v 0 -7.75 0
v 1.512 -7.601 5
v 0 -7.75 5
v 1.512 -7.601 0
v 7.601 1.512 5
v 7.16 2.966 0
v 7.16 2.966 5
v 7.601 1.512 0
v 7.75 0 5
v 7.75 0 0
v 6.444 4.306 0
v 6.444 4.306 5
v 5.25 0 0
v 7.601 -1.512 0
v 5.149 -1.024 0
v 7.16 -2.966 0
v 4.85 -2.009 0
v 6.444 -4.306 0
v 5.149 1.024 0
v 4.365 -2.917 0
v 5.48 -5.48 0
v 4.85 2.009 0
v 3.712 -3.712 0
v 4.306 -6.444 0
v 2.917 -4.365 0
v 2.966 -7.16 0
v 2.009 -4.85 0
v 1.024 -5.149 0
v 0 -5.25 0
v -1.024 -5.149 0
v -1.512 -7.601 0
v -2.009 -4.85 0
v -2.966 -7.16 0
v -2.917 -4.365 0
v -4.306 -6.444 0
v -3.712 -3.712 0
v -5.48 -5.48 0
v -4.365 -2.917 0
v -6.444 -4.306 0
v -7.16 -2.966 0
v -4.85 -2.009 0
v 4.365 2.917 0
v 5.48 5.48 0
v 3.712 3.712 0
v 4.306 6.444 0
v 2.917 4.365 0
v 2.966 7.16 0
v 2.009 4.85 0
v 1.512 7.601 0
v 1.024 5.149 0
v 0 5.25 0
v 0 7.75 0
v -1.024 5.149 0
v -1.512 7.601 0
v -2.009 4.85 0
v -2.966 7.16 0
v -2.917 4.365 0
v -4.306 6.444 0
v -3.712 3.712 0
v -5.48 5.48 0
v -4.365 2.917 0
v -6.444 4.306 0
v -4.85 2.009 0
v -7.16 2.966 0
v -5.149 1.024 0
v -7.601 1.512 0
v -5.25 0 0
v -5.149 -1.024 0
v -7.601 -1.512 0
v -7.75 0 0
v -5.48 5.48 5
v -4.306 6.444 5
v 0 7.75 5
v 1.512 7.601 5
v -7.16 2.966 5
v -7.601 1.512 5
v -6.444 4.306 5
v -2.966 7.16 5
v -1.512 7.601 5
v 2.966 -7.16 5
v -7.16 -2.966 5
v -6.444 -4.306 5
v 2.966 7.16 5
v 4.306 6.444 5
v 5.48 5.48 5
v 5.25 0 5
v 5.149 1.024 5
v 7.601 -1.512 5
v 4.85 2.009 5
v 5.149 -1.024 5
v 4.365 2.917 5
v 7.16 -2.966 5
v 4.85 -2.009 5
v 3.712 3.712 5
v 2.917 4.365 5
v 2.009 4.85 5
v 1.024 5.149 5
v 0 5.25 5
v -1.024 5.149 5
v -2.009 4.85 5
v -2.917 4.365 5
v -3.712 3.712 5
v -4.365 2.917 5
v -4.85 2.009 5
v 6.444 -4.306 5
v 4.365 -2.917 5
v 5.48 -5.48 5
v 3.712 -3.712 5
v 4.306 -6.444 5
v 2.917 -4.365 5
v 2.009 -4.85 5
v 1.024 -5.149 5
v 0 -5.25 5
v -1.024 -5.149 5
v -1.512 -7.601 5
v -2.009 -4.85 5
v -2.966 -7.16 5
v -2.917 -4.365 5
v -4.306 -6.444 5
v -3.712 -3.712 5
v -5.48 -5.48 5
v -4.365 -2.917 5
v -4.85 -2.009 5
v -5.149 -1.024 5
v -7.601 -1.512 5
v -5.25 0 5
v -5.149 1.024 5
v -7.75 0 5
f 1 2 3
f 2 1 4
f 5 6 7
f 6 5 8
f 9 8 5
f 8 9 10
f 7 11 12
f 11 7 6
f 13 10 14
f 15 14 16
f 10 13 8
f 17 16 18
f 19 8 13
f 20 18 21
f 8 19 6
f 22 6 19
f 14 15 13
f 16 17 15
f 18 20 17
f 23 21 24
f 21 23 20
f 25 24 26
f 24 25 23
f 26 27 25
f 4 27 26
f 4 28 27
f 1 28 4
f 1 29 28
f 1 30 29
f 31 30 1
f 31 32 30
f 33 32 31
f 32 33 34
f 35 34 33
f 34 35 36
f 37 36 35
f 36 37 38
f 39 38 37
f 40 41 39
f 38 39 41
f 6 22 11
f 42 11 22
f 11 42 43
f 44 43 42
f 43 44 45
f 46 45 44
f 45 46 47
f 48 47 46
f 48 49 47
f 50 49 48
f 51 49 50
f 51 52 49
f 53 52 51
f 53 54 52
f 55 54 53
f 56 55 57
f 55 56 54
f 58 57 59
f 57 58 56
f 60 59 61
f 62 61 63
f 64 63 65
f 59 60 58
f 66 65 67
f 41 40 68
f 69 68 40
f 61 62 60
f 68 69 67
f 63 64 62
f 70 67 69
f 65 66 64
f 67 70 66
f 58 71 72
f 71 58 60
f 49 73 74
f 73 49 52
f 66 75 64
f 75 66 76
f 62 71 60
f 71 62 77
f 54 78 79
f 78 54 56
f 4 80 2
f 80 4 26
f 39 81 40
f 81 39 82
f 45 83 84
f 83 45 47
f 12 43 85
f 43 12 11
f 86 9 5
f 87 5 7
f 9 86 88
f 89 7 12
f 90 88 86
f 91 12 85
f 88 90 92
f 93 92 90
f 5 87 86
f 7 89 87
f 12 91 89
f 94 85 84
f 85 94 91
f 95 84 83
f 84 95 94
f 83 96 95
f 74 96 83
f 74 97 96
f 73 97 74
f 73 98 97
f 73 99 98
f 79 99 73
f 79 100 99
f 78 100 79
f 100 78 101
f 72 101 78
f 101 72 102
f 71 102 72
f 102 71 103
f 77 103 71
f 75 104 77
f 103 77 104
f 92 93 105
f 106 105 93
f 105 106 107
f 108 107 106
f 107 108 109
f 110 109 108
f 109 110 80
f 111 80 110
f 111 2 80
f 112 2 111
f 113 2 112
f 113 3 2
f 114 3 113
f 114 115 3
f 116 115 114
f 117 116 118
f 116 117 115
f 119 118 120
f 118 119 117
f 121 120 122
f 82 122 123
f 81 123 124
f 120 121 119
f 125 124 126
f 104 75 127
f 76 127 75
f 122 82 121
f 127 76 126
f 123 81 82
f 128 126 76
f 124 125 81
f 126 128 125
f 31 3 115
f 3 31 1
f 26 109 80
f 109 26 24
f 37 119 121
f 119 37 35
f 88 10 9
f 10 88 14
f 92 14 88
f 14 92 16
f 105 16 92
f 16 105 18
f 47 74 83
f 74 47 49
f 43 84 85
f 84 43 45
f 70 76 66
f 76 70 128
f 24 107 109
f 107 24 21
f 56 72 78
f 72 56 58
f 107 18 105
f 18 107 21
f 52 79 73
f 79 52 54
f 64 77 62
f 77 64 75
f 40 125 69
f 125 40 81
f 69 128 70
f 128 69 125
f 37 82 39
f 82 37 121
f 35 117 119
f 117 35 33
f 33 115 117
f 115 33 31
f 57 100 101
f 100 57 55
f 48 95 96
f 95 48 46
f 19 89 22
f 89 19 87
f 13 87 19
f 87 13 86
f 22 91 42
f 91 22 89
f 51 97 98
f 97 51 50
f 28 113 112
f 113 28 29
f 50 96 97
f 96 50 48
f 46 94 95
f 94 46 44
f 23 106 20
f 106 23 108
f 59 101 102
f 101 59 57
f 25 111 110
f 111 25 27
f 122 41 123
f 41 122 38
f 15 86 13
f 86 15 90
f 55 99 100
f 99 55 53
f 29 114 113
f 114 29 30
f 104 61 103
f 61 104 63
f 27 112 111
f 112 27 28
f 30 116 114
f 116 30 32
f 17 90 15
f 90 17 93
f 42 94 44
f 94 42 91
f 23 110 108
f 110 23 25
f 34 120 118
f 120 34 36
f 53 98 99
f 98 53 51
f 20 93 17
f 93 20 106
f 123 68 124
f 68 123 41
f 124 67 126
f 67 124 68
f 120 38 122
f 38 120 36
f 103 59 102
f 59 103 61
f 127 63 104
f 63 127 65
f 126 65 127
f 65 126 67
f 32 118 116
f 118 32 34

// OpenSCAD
$fn = 32;

// ----------------------------------------------------------------------
// Spacer sleeve: 15.5 / 10.5 x 5 mm
// ----------------------------------------------------------------------

// --- parameters (mm) ---
tube_d = 15.5;            // outside diameter
bore_d = 10.5;            // shaft bore
tube_l = 5;               // sleeve length
step_d = 14.2;            // reduced diameter
step_l = 1.8;             // length of the step

module sleeve() {
  cylinder(h = tube_l, d = tube_d);
  translate([0, 0, tube_l - step_l]) cylinder(h = step_l, d = step_d);
}

difference() {
  sleeve();
  translate([0, 0, -1]) cylinder(h = tube_l + 2, d = bore_d);
}
